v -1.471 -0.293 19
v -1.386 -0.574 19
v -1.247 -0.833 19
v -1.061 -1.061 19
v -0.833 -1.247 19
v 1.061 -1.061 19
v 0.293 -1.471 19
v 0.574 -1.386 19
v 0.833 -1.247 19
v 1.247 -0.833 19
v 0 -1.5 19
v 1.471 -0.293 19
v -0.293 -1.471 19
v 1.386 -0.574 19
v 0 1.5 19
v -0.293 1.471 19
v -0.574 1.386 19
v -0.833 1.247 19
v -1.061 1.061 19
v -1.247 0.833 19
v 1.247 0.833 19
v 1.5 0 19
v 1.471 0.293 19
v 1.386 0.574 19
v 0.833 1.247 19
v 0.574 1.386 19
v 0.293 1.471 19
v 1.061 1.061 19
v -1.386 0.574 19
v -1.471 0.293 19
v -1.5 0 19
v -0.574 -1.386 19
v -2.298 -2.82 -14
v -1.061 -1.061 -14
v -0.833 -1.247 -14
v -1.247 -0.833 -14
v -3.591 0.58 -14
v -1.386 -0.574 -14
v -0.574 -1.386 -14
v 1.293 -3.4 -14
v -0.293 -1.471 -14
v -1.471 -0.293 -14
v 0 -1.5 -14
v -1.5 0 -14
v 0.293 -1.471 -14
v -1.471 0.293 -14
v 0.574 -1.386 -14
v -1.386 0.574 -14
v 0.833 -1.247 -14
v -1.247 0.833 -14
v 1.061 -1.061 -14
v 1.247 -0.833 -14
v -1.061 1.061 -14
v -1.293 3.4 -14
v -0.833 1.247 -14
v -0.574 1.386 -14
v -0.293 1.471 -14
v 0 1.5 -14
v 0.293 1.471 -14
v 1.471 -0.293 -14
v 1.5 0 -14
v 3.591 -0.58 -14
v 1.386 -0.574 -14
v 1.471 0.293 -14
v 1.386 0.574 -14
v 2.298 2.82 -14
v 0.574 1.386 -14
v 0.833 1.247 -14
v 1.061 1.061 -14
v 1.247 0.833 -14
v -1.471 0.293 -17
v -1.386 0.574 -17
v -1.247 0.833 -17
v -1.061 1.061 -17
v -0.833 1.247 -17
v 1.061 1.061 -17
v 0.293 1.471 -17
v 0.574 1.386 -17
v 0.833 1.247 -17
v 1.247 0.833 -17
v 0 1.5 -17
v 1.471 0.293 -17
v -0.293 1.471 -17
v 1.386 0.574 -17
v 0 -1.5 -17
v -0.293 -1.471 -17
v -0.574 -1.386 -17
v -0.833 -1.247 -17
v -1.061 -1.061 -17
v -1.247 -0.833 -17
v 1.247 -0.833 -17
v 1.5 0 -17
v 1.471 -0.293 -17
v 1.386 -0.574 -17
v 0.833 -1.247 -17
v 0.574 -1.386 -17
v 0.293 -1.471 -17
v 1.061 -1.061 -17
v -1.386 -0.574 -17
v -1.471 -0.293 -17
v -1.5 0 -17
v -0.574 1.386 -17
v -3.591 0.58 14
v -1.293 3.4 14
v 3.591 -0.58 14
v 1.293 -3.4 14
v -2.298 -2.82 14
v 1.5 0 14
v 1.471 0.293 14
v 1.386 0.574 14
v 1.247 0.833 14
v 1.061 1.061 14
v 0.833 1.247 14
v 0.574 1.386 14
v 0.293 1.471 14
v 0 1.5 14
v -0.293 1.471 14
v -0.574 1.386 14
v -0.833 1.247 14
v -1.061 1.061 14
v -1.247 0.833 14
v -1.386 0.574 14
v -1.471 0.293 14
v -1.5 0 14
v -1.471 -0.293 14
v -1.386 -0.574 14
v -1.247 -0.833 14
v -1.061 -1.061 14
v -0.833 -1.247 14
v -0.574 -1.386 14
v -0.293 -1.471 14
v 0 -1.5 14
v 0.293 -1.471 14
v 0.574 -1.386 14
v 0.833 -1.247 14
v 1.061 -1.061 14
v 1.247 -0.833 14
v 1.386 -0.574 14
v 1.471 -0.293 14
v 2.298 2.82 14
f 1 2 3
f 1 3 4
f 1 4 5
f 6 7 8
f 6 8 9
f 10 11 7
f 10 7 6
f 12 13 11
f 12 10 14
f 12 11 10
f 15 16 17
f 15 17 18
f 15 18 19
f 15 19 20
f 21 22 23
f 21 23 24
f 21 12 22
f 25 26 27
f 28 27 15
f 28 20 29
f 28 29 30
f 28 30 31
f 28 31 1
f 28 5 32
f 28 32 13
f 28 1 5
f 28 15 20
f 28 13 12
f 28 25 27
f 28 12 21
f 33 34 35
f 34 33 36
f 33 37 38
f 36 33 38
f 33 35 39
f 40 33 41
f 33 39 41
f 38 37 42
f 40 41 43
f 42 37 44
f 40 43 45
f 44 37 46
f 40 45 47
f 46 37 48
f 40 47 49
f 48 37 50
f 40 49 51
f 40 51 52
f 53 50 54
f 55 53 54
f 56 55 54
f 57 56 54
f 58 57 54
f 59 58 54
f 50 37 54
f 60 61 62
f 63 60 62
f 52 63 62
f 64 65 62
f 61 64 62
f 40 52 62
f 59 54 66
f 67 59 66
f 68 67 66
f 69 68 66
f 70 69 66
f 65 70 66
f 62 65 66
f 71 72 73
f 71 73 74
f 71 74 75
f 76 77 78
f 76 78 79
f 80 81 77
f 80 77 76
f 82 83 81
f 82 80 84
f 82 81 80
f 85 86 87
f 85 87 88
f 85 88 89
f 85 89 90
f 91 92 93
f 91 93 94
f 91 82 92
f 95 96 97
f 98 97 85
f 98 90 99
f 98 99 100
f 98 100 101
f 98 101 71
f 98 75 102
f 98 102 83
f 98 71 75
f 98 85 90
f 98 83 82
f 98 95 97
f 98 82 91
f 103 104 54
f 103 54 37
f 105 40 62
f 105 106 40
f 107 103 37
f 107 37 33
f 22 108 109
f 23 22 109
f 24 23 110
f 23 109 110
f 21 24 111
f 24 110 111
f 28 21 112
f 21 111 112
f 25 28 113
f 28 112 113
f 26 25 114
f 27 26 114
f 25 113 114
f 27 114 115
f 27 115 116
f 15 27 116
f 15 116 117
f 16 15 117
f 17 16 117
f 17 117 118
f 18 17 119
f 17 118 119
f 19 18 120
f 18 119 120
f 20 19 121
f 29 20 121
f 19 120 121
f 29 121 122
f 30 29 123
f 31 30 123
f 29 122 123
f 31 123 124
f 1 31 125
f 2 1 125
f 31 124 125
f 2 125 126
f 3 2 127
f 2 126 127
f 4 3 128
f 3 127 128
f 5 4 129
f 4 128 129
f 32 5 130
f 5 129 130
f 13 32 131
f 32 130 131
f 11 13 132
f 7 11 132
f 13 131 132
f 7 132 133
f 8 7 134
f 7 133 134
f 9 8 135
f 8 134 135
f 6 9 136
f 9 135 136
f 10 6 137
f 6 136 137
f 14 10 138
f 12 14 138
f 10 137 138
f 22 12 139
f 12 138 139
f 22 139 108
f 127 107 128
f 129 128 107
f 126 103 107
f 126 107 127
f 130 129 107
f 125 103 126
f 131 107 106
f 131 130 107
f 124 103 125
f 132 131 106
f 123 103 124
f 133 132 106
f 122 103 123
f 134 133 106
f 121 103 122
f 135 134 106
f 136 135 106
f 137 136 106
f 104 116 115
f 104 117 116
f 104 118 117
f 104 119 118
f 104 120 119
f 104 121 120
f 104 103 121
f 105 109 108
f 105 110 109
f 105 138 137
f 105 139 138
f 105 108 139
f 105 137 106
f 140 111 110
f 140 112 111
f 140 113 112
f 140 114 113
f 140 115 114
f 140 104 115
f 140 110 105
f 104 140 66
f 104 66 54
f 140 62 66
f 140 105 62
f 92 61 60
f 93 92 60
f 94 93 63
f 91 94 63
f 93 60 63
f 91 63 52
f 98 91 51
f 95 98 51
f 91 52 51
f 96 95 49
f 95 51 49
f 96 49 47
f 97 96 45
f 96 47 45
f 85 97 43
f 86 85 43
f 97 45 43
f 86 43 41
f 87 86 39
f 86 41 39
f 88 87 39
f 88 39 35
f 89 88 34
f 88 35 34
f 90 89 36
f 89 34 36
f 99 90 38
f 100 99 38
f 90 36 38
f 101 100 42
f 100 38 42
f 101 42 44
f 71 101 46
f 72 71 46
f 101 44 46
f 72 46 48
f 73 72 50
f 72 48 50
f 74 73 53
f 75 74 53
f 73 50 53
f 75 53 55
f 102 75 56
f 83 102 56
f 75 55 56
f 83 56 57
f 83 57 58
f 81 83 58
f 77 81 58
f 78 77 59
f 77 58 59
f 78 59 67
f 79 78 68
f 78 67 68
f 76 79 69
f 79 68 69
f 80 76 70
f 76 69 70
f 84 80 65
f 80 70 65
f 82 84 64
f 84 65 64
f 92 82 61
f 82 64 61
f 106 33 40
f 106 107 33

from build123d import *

# Parameters (mm, degrees)
F0_R     = 1.5
F1_DEPTH = 14
F2_DEPTH = 14
F3_R     = 1.5
F4_DEPTH = 3
F5_R     = 1.5
F6_DEPTH = 5


with BuildPart() as f1:
    # F0 (on Top) → F1 (new body, symmetric)
    with BuildSketch(Plane.XY):
        Polygon((3.590729, -0.580228), (2.297857, 2.819549), (-1.292872, 3.399777), (-3.590729, 0.580228), (-2.297857, -2.819549), (1.292872, -3.399777), align=None)
        Circle(F0_R, mode=Mode.SUBTRACT)
    extrude(amount=F1_DEPTH, both=True)

    # F0 (on Top) → F2 (join, symmetric)
    with BuildSketch(Plane.XY):
        Circle(F0_R)
    extrude(amount=F2_DEPTH, both=True)

    # F3 (on face) → F4 (join)
    with BuildSketch(Plane(origin=(0, 0, -14), x_dir=(1, 0, 0), z_dir=(0, 0, -1))):
        Circle(F3_R)
    extrude(amount=F4_DEPTH)

    # F5 (on face) → F6 (join)
    with BuildSketch(Plane.XY.offset(14)):
        Circle(F5_R)
    extrude(amount=F6_DEPTH)


solid = f1.part
